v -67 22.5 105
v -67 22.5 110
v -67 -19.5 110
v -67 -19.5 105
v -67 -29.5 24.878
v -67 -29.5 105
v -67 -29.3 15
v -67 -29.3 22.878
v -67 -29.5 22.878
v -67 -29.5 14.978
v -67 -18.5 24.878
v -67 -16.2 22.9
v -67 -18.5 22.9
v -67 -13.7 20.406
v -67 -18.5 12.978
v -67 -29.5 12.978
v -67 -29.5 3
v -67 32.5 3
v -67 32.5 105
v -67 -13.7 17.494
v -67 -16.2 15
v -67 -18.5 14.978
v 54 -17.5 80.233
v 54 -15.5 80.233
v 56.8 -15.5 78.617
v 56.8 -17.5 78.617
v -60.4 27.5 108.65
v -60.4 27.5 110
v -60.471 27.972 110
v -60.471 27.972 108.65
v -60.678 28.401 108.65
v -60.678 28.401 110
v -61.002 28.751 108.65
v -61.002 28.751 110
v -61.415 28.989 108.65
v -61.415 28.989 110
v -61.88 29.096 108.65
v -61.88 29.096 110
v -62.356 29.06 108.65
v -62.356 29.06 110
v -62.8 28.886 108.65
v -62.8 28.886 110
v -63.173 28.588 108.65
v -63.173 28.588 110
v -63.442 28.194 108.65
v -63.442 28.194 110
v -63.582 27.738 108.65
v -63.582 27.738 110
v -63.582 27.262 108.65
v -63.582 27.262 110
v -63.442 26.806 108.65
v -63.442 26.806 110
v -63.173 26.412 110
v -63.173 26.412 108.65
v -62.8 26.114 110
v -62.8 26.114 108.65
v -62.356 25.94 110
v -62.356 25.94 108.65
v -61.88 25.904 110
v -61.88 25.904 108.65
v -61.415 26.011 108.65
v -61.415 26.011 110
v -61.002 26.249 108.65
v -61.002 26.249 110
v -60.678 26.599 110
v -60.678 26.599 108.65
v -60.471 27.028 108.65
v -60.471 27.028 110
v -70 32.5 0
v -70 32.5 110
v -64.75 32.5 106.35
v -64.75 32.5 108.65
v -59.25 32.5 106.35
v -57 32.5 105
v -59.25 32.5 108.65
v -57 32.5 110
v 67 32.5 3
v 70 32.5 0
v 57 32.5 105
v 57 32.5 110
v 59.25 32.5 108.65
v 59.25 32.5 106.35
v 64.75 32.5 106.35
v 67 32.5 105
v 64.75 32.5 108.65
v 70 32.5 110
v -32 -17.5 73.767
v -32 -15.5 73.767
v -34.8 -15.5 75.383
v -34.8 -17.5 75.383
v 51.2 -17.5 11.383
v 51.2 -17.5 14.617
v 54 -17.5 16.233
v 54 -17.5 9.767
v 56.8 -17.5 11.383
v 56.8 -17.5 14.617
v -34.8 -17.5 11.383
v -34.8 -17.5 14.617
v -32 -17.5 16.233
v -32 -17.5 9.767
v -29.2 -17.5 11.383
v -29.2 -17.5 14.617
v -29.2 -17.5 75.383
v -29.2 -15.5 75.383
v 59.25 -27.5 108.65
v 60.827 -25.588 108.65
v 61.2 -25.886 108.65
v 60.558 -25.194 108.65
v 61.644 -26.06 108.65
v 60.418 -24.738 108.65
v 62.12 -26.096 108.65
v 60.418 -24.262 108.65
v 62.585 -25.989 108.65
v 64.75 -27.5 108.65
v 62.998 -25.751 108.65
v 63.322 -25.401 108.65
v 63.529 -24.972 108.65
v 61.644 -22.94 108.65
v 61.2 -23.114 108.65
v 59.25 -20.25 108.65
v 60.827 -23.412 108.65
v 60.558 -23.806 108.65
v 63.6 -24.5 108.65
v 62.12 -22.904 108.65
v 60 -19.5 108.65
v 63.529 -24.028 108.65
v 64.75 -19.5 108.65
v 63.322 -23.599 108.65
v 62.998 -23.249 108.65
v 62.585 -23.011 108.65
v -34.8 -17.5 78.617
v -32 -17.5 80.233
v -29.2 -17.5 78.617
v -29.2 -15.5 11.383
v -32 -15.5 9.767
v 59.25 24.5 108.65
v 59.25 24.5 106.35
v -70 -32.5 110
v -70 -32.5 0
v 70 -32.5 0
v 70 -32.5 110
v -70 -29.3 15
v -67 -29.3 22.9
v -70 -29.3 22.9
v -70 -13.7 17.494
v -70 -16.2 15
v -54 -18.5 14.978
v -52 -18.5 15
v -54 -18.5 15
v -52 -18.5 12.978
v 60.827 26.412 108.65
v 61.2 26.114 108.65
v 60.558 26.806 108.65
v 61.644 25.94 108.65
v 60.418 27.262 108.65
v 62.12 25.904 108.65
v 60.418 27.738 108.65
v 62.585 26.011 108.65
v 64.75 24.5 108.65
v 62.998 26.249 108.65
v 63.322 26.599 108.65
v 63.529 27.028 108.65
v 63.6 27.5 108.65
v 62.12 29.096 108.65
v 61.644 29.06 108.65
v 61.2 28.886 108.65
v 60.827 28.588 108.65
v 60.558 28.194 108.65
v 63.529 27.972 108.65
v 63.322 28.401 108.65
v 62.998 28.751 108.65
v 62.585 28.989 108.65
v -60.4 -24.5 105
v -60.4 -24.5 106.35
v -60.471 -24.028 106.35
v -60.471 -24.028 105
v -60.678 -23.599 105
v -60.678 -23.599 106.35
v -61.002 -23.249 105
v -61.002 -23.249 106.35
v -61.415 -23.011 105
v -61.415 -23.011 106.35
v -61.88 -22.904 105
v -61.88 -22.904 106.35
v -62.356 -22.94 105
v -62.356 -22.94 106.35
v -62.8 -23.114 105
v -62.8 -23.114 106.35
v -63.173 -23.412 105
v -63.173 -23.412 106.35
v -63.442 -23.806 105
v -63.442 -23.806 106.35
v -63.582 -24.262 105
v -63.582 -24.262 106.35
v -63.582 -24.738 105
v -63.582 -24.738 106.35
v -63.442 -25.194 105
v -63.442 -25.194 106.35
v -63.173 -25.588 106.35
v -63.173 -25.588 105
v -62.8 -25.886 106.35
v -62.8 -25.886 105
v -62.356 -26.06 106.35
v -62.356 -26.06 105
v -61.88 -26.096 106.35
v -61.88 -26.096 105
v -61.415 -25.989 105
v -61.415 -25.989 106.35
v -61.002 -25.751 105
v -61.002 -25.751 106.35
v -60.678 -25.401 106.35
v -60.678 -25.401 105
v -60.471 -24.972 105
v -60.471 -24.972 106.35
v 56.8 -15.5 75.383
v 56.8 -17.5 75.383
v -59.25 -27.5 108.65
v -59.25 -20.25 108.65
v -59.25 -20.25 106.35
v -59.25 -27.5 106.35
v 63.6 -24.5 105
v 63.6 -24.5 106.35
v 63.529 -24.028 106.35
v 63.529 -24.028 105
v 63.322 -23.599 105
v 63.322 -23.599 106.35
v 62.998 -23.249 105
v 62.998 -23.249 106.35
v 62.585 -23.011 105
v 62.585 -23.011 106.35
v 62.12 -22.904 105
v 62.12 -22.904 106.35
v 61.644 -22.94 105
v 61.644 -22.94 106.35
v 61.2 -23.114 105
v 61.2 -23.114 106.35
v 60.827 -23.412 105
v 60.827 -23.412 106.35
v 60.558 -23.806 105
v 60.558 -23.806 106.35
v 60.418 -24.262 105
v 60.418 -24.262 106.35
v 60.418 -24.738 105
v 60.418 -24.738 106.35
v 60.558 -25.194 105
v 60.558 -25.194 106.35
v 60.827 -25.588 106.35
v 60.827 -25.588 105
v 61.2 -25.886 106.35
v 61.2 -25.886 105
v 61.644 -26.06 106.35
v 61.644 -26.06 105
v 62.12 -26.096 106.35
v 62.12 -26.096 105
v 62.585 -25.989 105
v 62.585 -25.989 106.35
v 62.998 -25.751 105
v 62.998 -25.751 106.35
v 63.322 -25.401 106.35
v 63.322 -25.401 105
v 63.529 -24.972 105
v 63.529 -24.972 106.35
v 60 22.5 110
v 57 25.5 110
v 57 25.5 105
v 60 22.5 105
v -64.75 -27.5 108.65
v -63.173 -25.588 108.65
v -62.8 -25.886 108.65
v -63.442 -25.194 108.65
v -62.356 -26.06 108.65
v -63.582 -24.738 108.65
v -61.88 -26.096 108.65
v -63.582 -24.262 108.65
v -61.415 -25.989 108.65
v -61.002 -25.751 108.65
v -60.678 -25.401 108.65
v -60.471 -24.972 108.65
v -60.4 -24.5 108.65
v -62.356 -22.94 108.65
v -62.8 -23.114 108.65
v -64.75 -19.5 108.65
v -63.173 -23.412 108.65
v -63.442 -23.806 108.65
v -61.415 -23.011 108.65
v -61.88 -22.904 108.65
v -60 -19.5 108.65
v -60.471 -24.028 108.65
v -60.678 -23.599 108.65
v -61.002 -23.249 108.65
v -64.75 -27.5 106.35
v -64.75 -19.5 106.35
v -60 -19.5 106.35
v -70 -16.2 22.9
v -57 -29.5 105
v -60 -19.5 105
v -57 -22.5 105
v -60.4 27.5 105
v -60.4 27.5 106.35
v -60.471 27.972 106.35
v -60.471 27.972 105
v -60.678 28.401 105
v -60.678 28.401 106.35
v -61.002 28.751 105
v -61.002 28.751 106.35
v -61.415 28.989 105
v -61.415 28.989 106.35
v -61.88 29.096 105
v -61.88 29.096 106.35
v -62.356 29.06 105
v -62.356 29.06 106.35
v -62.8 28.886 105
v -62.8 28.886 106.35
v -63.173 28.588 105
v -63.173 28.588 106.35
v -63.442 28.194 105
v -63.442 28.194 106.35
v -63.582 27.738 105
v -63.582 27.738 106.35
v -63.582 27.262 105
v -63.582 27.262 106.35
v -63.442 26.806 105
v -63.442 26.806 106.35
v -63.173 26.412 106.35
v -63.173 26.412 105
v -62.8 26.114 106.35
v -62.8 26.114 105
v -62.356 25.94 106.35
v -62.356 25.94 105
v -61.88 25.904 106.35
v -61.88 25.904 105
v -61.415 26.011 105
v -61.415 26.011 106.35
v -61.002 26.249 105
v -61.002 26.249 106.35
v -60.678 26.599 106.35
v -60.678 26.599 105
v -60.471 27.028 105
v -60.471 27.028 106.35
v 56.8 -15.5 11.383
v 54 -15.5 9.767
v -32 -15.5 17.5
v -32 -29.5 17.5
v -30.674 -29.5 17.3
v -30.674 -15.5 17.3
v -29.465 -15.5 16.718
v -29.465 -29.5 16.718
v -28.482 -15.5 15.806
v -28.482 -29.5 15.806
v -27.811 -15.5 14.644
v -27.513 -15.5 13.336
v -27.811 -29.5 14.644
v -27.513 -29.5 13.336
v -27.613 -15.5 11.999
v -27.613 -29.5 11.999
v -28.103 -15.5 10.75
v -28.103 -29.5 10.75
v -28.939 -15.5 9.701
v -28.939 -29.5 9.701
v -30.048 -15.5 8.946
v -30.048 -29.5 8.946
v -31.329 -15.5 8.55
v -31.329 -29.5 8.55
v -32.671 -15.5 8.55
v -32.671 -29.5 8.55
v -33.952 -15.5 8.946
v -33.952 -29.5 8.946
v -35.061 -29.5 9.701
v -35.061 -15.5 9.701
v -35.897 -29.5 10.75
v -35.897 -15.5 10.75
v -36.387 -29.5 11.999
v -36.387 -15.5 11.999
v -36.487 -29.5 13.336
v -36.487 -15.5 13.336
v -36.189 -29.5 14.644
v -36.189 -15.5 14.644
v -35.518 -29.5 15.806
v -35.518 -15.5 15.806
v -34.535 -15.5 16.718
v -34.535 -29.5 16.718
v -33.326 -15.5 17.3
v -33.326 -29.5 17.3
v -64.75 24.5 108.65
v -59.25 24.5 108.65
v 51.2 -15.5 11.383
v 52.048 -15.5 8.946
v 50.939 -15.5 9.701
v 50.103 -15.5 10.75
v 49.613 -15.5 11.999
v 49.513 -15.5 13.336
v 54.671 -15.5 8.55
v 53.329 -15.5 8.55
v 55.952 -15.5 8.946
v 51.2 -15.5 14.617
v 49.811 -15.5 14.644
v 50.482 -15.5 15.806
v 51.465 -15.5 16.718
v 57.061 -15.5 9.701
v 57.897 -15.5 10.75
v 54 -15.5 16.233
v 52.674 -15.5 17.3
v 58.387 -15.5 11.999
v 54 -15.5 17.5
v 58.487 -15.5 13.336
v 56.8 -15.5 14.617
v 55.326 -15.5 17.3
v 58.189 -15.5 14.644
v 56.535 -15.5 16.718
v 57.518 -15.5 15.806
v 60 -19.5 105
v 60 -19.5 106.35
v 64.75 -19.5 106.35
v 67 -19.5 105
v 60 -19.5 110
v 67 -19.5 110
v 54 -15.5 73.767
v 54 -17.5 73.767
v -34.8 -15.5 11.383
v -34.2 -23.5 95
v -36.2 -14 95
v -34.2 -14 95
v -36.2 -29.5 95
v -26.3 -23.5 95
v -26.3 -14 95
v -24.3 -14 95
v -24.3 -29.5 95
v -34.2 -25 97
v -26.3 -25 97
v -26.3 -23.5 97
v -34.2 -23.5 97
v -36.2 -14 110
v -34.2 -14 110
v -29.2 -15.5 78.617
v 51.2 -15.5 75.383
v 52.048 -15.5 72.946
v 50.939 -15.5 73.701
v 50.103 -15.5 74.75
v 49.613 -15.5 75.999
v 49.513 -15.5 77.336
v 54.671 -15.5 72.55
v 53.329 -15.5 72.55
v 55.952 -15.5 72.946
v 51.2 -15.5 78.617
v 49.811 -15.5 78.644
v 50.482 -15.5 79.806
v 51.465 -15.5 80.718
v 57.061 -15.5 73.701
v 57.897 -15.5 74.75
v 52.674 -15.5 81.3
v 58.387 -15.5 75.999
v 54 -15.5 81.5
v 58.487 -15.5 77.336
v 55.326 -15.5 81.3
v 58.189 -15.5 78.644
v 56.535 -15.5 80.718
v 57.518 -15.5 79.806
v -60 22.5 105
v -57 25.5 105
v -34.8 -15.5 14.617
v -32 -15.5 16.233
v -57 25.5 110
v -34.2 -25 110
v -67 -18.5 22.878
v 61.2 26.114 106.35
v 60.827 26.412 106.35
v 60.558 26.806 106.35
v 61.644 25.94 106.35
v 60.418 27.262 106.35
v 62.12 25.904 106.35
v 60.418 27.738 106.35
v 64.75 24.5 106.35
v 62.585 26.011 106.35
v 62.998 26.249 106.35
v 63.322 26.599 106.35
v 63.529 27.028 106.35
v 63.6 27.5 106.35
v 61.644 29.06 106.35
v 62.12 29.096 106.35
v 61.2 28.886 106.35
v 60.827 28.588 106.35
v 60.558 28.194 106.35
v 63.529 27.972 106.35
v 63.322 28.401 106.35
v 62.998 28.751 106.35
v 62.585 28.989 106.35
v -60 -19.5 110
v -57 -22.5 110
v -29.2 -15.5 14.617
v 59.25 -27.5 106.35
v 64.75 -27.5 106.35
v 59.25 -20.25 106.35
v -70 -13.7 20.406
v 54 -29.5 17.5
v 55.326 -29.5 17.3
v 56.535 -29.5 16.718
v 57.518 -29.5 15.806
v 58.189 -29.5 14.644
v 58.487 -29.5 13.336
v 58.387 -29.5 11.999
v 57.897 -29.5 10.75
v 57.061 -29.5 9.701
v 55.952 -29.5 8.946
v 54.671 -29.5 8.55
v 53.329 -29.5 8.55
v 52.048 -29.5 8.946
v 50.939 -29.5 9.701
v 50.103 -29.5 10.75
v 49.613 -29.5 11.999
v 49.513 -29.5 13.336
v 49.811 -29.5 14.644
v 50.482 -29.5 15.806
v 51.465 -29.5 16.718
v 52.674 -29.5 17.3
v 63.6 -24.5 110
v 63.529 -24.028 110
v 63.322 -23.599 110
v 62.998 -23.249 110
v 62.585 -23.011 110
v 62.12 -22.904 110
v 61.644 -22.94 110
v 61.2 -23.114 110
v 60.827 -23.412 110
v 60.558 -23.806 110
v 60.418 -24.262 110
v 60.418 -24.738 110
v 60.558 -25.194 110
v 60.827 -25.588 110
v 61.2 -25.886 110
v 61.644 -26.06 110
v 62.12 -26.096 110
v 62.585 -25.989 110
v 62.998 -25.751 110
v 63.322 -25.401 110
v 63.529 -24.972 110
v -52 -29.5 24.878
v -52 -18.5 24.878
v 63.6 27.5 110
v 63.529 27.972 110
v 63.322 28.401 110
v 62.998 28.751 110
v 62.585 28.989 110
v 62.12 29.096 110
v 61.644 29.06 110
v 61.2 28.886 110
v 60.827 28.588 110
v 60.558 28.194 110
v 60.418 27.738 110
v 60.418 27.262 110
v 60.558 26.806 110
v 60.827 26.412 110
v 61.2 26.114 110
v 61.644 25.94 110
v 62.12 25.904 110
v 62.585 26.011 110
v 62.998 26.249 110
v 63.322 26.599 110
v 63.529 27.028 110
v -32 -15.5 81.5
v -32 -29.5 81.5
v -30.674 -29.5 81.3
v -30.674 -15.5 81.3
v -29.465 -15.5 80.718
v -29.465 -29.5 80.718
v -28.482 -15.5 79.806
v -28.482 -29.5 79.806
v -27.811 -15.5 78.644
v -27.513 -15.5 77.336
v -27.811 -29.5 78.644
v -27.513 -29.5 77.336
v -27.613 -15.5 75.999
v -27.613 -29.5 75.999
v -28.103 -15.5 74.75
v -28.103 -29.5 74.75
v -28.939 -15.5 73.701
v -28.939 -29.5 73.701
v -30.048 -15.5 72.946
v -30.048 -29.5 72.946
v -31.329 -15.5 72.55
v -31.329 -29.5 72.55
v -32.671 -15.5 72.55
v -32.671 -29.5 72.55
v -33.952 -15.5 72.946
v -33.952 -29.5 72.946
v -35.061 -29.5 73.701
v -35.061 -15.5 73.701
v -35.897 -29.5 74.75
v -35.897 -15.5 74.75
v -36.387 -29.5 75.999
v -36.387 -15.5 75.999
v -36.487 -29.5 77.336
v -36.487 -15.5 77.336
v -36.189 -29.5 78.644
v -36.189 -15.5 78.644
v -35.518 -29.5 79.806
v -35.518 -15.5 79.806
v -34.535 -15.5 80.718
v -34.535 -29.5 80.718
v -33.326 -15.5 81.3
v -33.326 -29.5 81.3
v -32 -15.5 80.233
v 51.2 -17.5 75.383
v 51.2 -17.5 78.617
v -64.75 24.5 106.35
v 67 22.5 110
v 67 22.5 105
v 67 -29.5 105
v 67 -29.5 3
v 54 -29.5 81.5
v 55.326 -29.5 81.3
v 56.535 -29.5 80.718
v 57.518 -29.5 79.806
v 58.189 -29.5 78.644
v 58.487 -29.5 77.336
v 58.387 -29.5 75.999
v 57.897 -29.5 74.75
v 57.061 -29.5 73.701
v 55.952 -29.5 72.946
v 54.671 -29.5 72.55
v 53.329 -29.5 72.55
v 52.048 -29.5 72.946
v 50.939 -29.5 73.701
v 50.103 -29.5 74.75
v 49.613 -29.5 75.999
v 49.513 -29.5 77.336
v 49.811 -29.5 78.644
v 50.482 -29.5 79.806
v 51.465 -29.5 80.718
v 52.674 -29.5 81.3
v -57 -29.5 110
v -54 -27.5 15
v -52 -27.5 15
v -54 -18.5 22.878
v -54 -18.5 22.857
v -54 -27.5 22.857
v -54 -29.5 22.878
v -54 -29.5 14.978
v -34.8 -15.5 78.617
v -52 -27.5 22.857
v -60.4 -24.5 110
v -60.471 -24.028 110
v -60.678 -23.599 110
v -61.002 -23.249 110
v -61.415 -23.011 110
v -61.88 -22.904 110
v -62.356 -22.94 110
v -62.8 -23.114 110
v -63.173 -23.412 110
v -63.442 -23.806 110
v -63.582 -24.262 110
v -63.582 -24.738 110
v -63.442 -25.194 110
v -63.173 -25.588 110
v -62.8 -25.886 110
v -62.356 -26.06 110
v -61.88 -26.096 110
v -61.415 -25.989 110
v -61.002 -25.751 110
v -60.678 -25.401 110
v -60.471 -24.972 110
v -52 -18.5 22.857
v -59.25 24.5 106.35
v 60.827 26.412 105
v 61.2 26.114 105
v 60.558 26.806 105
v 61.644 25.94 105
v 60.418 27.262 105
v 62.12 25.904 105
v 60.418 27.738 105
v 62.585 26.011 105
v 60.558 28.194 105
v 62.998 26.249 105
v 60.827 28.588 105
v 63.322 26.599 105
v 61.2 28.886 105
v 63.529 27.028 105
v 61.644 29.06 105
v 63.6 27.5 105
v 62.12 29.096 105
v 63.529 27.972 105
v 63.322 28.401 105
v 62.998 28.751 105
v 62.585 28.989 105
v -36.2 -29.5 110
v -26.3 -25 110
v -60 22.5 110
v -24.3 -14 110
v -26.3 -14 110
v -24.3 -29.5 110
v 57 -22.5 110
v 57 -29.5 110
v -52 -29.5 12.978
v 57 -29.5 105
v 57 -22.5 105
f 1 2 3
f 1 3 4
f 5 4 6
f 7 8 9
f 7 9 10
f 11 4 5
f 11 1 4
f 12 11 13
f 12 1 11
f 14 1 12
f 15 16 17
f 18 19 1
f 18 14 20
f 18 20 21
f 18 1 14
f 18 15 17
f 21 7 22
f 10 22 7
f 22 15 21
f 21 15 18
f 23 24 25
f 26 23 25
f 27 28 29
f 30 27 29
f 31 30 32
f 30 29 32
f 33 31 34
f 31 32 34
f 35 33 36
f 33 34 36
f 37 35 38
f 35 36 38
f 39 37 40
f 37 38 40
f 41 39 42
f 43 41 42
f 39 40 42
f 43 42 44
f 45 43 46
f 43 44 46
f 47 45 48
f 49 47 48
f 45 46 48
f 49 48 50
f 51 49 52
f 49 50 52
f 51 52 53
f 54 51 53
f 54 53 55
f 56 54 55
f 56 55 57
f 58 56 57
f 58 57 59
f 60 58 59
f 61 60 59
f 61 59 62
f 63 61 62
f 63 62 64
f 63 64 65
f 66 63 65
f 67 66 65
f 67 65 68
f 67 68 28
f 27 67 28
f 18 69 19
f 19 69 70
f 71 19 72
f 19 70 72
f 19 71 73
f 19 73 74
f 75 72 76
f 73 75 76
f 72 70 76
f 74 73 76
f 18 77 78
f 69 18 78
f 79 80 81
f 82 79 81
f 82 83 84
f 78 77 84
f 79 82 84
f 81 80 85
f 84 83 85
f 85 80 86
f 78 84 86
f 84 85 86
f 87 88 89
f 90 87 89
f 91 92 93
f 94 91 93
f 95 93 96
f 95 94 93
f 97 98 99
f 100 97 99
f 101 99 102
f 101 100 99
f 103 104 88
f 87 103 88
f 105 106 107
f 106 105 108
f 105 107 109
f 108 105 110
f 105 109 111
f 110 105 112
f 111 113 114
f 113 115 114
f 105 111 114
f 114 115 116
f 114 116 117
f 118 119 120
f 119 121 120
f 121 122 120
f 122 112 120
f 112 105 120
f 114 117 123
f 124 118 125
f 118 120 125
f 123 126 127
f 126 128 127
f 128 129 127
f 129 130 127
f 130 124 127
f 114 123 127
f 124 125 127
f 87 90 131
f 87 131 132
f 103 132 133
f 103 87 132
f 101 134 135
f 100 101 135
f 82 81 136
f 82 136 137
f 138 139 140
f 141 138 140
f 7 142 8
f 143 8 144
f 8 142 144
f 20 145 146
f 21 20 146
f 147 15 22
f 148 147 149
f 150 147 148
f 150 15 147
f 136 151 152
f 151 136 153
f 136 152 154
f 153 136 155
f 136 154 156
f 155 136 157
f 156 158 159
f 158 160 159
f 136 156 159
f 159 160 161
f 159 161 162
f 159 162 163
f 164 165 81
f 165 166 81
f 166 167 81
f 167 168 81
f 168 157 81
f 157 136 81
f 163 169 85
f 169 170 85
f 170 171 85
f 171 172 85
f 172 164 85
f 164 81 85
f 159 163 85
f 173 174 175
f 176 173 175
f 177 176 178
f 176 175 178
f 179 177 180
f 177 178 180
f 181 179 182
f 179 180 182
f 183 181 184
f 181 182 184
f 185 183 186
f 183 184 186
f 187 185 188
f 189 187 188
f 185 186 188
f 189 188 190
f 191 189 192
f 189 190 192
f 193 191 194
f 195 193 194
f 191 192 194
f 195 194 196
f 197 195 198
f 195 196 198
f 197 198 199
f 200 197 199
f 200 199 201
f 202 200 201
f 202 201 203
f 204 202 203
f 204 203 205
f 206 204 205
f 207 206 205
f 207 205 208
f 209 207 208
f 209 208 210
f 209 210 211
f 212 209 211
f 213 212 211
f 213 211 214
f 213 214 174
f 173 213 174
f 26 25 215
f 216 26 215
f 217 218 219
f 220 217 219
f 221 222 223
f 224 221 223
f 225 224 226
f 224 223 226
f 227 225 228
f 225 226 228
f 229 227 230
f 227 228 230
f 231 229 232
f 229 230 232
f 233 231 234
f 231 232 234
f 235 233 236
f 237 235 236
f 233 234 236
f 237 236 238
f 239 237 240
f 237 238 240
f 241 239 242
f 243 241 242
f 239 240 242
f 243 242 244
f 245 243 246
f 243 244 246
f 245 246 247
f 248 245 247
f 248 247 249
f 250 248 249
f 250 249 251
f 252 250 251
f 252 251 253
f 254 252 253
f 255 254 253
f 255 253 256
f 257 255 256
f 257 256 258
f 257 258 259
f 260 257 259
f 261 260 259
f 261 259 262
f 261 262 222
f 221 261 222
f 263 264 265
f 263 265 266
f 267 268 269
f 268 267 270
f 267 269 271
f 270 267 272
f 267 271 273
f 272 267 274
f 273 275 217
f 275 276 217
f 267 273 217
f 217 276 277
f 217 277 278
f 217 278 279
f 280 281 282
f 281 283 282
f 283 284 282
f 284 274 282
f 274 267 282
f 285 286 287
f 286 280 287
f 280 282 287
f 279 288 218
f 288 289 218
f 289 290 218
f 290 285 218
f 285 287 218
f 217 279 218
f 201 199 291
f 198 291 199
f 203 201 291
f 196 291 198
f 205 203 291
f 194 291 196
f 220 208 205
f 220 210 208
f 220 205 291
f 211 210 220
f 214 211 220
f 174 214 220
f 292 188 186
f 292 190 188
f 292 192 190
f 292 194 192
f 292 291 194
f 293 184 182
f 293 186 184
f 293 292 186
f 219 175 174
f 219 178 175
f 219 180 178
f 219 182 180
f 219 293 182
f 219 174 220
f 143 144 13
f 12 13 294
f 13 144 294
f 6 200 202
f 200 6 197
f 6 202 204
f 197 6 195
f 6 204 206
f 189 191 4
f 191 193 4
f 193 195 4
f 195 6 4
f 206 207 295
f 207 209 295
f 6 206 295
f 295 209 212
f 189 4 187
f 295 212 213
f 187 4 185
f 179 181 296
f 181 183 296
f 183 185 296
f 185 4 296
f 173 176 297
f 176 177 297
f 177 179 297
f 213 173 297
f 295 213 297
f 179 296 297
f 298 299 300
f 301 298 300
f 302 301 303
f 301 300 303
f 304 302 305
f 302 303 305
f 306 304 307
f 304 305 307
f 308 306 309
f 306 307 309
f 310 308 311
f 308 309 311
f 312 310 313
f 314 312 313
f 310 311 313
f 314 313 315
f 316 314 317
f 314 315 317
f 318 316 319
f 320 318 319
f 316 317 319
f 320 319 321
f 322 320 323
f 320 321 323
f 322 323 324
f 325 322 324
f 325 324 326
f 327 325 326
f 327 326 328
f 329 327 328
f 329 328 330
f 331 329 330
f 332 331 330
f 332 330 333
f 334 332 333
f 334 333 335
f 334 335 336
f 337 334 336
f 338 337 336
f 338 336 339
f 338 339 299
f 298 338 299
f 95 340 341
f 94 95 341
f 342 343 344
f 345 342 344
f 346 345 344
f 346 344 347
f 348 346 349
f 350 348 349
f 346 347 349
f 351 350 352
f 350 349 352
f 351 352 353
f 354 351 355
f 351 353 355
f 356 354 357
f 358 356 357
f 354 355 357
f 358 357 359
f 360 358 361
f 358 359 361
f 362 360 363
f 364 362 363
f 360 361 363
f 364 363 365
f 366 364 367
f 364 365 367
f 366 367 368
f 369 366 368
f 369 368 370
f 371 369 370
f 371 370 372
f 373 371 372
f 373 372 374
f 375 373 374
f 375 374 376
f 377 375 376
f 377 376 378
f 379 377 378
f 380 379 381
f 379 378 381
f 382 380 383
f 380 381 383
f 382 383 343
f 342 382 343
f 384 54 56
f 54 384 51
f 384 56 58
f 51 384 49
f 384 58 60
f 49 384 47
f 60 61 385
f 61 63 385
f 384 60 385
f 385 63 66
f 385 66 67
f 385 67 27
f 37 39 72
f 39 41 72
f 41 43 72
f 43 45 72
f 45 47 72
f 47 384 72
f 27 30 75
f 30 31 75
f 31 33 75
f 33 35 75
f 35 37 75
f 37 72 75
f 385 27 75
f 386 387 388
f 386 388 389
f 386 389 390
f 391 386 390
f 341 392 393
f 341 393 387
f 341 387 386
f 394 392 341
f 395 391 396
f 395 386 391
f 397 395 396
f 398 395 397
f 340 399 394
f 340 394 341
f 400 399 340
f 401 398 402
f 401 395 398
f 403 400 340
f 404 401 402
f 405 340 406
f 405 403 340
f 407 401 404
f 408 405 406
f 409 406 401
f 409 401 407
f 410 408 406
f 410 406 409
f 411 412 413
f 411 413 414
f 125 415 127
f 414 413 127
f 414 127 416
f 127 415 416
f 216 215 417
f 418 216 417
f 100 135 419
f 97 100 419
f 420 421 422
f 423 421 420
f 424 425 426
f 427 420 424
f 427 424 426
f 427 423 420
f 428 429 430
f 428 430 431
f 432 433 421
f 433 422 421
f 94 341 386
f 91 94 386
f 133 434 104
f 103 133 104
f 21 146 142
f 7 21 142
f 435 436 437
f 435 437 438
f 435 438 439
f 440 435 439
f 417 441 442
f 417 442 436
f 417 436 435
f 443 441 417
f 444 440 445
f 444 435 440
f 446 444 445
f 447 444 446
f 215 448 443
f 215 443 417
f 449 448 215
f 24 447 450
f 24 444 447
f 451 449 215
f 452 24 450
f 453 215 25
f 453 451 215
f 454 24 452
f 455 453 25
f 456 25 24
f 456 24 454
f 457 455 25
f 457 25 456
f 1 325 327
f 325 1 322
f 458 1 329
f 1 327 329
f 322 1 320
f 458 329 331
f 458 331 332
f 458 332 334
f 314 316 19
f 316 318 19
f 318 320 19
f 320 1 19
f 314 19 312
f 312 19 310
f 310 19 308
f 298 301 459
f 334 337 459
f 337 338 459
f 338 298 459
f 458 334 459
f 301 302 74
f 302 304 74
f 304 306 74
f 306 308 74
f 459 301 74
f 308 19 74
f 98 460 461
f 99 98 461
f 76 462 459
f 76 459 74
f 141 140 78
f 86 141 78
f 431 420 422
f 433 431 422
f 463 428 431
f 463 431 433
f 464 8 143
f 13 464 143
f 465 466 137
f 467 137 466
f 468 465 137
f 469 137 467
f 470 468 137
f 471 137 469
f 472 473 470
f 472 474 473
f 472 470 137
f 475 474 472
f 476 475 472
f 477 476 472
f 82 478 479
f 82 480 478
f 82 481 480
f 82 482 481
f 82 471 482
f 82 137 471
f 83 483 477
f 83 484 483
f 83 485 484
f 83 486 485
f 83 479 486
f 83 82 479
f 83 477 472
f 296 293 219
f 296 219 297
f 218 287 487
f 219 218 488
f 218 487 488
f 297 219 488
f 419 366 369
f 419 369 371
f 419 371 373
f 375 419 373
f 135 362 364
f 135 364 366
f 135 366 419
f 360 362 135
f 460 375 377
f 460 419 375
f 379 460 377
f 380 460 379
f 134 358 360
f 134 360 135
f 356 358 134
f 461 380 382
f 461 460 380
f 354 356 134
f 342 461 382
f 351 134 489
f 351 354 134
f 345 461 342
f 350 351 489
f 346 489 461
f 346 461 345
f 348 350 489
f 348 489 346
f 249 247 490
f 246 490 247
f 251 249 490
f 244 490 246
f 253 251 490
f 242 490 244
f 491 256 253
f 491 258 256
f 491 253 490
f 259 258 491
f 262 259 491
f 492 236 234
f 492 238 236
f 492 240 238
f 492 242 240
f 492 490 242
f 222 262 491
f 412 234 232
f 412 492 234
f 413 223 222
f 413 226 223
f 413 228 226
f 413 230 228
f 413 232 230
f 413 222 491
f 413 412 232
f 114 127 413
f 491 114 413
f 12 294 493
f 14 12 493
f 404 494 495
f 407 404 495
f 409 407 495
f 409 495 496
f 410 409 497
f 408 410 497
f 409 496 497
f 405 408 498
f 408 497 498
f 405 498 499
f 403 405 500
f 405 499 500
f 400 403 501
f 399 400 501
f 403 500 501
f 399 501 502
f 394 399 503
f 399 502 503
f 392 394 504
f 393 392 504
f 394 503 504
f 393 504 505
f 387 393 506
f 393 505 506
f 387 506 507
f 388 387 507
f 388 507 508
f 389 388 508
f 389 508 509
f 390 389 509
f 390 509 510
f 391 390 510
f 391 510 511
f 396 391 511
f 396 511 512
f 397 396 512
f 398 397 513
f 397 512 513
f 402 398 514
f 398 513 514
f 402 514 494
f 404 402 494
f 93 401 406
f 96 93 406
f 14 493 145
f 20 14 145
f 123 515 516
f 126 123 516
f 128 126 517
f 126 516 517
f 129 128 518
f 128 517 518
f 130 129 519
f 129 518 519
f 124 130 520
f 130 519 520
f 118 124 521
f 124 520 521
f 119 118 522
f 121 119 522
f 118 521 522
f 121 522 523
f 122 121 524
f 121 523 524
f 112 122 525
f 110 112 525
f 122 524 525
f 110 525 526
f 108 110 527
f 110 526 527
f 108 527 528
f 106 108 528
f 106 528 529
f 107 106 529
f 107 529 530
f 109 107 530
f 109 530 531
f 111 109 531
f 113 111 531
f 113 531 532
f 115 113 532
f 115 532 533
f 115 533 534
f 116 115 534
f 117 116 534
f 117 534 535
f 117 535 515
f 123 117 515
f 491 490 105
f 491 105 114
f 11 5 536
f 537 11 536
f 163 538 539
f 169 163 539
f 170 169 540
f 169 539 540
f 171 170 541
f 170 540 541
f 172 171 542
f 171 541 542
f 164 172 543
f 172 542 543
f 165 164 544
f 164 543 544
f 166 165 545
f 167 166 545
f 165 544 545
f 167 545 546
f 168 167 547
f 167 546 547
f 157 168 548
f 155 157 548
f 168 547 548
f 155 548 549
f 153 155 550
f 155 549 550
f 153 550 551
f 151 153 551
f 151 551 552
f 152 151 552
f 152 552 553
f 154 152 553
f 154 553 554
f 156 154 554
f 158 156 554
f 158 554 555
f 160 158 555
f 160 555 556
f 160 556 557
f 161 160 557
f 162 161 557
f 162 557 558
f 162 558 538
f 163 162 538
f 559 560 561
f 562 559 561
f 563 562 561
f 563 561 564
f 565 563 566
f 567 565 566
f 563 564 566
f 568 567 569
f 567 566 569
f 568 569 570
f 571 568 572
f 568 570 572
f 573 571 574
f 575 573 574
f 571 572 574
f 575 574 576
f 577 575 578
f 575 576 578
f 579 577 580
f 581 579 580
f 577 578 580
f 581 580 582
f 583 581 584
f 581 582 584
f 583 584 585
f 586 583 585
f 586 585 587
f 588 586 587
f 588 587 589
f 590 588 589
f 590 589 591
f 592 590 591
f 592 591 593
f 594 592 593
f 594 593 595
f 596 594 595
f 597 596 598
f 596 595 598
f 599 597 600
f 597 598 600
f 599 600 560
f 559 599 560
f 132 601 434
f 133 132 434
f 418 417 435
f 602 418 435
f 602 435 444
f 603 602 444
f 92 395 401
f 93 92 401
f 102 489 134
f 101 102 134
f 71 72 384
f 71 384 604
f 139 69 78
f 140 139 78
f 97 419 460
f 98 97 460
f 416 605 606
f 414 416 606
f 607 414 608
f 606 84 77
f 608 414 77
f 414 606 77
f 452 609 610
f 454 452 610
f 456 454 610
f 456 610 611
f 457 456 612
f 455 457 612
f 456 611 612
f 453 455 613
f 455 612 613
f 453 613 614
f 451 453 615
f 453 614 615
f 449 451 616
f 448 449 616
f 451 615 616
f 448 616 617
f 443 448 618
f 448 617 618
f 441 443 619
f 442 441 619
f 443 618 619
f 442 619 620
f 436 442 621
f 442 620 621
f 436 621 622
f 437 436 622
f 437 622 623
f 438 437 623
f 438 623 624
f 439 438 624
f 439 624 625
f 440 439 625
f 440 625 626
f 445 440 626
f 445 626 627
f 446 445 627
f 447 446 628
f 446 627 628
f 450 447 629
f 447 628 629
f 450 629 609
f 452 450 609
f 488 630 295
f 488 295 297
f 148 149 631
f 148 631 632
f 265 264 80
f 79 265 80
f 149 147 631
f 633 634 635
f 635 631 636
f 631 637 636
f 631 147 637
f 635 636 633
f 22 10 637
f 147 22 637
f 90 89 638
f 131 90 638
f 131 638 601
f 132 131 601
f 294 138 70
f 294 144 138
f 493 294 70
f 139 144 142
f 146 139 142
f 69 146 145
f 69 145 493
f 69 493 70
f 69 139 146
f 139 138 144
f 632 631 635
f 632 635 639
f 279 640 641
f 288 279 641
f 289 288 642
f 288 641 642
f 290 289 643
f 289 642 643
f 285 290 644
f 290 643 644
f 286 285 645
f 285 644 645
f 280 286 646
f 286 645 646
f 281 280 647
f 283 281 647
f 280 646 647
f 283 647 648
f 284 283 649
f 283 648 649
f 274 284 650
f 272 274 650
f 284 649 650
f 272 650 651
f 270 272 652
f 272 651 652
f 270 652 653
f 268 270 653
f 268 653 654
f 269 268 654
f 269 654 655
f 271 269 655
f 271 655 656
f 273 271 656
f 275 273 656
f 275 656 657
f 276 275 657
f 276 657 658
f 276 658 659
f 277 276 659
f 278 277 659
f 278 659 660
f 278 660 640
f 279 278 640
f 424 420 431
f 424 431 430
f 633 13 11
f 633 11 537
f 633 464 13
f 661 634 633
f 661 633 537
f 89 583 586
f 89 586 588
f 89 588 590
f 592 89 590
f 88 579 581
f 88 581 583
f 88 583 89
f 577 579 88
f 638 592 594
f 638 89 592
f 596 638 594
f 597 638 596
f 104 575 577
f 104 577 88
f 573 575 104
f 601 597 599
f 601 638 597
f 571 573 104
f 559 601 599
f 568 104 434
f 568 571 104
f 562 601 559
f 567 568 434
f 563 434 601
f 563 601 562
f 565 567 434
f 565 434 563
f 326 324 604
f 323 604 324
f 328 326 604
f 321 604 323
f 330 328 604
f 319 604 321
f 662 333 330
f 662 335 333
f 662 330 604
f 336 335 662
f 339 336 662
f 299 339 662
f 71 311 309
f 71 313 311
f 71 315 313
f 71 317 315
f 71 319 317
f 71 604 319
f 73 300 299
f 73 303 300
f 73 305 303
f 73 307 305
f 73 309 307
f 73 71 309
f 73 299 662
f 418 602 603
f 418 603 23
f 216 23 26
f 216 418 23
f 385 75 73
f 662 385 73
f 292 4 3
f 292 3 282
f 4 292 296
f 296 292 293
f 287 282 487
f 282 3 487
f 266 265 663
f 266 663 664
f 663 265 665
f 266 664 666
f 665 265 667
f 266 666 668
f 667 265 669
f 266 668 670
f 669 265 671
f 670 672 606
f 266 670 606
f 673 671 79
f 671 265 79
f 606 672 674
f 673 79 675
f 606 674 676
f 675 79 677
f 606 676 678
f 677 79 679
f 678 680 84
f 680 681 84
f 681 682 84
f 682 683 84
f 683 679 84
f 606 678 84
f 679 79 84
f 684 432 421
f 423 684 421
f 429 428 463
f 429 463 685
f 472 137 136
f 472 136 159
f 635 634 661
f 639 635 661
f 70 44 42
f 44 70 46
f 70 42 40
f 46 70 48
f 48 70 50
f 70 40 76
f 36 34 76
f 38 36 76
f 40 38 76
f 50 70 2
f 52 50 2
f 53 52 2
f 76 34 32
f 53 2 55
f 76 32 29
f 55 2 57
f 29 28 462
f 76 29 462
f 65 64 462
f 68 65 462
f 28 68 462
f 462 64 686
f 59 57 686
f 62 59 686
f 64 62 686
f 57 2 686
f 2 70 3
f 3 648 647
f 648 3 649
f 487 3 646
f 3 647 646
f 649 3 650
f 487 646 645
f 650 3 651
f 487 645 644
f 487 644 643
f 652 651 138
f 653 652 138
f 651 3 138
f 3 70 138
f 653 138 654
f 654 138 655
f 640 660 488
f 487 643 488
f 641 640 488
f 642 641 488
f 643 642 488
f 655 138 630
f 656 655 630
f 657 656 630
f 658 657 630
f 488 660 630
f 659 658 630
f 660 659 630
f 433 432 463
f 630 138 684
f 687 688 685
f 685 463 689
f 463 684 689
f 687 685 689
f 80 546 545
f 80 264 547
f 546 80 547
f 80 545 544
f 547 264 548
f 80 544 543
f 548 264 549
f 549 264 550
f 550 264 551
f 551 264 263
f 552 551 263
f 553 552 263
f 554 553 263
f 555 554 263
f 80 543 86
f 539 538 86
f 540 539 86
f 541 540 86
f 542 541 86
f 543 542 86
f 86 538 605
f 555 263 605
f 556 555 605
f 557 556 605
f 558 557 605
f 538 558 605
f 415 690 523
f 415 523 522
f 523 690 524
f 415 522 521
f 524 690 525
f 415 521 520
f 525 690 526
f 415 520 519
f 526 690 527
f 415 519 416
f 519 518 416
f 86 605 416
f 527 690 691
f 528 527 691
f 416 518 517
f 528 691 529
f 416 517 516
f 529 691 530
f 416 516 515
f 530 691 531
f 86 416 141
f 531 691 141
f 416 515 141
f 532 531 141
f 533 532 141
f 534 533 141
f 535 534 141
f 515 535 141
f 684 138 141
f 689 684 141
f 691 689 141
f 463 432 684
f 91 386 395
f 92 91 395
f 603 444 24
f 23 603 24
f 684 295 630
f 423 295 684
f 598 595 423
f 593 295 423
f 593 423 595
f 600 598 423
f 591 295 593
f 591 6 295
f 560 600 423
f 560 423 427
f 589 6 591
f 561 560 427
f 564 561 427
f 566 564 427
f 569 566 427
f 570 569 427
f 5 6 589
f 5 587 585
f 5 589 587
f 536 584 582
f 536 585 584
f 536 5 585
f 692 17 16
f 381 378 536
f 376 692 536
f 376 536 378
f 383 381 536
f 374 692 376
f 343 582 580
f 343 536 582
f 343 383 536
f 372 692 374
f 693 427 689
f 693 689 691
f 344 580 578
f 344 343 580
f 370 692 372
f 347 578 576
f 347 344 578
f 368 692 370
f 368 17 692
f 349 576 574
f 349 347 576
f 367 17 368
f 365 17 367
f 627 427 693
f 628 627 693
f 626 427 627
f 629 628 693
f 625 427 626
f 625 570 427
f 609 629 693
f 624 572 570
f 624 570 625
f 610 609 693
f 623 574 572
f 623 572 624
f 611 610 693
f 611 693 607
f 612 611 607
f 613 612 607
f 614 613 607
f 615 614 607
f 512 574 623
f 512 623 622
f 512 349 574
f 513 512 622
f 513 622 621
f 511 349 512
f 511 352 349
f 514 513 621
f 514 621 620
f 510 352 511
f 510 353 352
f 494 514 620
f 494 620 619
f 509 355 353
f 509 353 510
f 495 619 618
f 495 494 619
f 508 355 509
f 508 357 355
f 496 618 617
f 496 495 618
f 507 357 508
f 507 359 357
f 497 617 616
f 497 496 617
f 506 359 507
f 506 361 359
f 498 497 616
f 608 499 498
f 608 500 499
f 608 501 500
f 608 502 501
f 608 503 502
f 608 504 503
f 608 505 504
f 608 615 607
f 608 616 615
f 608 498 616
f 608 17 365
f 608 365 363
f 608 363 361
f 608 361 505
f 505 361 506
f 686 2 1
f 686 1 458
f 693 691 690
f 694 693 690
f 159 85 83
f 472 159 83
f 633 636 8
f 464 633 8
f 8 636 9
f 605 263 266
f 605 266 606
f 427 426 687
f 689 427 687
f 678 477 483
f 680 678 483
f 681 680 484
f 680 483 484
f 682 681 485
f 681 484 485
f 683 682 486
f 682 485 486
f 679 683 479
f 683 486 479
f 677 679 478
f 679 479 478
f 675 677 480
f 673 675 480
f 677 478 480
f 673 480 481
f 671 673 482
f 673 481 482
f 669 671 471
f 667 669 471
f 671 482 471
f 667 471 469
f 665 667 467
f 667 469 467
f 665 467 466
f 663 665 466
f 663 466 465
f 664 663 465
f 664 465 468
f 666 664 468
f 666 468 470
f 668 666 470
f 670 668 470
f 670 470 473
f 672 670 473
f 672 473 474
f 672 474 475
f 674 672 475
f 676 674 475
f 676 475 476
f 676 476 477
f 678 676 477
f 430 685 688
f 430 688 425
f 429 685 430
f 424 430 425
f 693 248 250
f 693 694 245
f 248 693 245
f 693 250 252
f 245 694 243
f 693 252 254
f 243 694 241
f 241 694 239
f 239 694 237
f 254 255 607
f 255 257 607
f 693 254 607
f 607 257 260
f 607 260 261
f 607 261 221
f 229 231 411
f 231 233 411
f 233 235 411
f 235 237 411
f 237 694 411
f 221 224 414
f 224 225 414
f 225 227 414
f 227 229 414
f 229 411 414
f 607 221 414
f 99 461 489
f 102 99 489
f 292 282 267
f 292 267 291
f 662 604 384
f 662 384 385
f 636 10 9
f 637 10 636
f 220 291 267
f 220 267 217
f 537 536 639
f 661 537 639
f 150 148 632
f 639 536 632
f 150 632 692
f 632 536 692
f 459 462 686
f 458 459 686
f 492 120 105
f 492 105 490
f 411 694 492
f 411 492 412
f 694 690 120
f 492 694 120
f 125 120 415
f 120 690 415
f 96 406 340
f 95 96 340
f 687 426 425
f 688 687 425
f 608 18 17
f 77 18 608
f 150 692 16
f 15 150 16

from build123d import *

# Parameters (mm, degrees)
SKETCH_2_W          = 140
SKETCH_2_H          = 65
EXTRUDE_1_DEPTH     = 110
SKETCH_3_W          = 134
SKETCH_3_H          = 107
CUT_EXTRUDE_1_DEPTH = 62
SKETCH_4_W          = 10
SKETCH_4_H          = 10
SKETCH_4_R          = 1.6
EXTRUDE_2_DEPTH     = 5
SKETCH_5_W          = 10
SKETCH_5_H          = 10
SKETCH_5_R          = 1.6
EXTRUDE_3_DEPTH     = 5
SKETCH_6_W          = 5.5
SKETCH_6_H          = 2.3
CUT_EXTRUDE_2_DEPTH = 8
SKETCH_8_W          = 5.5
SKETCH_8_H          = 2.3
CUT_EXTRUDE_3_DEPTH = 8
CHAMFER_1_SIZE      = 3
SKETCH_9_R          = 4.5
EXTRUDE_4_DEPTH     = 14
CUT_EXTRUDE_4_DEPTH = 2
CUT_EXTRUDE_5_REACH = 182.987
EXTRUDE_5_DEPTH     = 11
SKETCH_16_W         = 5.817441426
SKETCH_16_H         = 7.857396667
CUT_EXTRUDE_6_DEPTH = 9
EXTRUDE_6_DEPTH     = 15.5
SKETCH_18_W         = 7.9
SKETCH_18_H         = 11.370001712
CUT_EXTRUDE_7_DEPTH = 9.5
SKETCH_19_W         = 7.9
SKETCH_19_H         = 13
EXTRUDE_7_DEPTH     = 4.5


with BuildPart() as part:
    # Эскиз2 → Бобышка-Вытянуть1 (new body)
    with BuildSketch(Plane.XY):
        Rectangle(SKETCH_2_W, SKETCH_2_H)
    extrude(amount=EXTRUDE_1_DEPTH)

    # Эскиз3 → Вырез-Вытянуть1 (cut)
    with BuildSketch(Plane(origin=(0, 32.5, 0), x_dir=(1, 0, 0), z_dir=(0, 1, 0))):
        with Locations((0, -56.5)):
            Rectangle(SKETCH_3_W, SKETCH_3_H)
    extrude(amount=-CUT_EXTRUDE_1_DEPTH, mode=Mode.SUBTRACT)

    # Эскиз4 → Бобышка-Вытянуть2 (add)
    # profile 1 of 2: a face of its own
    with BuildSketch(Plane.XY.offset(110)):
        with Locations((62, -24.5)):
            Rectangle(SKETCH_4_W, SKETCH_4_H)
        with Locations((62, -24.5)):
            Circle(SKETCH_4_R, mode=Mode.SUBTRACT)
    # profile 2 of 2: a face of its own
    with BuildSketch(Plane.XY.offset(110)):
        with Locations((-62, -24.5)):
            Rectangle(SKETCH_4_W, SKETCH_4_H)
        with Locations((-62, -24.5)):
            Circle(SKETCH_4_R, mode=Mode.SUBTRACT)
    extrude(amount=-EXTRUDE_2_DEPTH)

    # Эскиз5 → Бобышка-Вытянуть3 (add)
    # profile 1 of 2: a face of its own
    with BuildSketch(Plane.XY.offset(110)):
        with Locations((62, 27.5)):
            Rectangle(SKETCH_5_W, SKETCH_5_H)
        with Locations((62, 27.5)):
            Circle(SKETCH_5_R, mode=Mode.SUBTRACT)
    # profile 2 of 2: a face of its own
    with BuildSketch(Plane.XY.offset(110)):
        with Locations((-62, 27.5)):
            Rectangle(SKETCH_5_W, SKETCH_5_H)
        with Locations((-62, 27.5)):
            Circle(SKETCH_5_R, mode=Mode.SUBTRACT)
    extrude(amount=-EXTRUDE_3_DEPTH)

    # Эскиз6 → Вырез-Вытянуть2 (cut)
    with BuildSketch(Plane(origin=(0, 32.5, 0), x_dir=(1, 0, 0), z_dir=(0, 1, 0))):
        with Locations((-62, -107.5)):
            Rectangle(SKETCH_6_W, SKETCH_6_H)
        with Locations((62, -107.5)):
            Rectangle(SKETCH_6_W, SKETCH_6_H)
    extrude(amount=-CUT_EXTRUDE_2_DEPTH, mode=Mode.SUBTRACT)

    # Эскиз8 → Вырез-Вытянуть3 (cut)
    with BuildSketch(Plane(origin=(0, -19.5, 0), x_dir=(1, 0, 0), z_dir=(0, 1, 0))):
        with Locations((62, -107.5)):
            Rectangle(SKETCH_8_W, SKETCH_8_H)
        with Locations((-62, -107.5)):
            Rectangle(SKETCH_8_W, SKETCH_8_H)
    extrude(amount=-CUT_EXTRUDE_3_DEPTH, mode=Mode.SUBTRACT)

    # Фаска1
    # the kernel refuses this chamfer: 3 mm, written as the material it takes off along each edge
    with BuildSketch(Plane(origin=(57, 22.5, 117.715048964), x_dir=(-0.027495876610586768, 0.9996219169112968, 0), z_dir=(0, 0, -1))) as chamfer_1_piece_1:
        Polygon((CHAMFER_1_SIZE * 0.999621916911, CHAMFER_1_SIZE * 0.0274958766106), (-CHAMFER_1_SIZE * 0.0274958766106, CHAMFER_1_SIZE * 0.999621916911), (0, 0), align=None)
    extrude(amount=20.430097928, mode=Mode.SUBTRACT)
    with BuildSketch(Plane(origin=(57, -19.5, 117.715048964), x_dir=(-0.027495876610586768, -0.9996219169112968, 0), z_dir=(0, 0, -1)), Plane(origin=(-57, 22.5, 117.715048964), x_dir=(0.027495876610586733, 0.9996219169112968, 0), z_dir=(0, 0, -1)), Plane(origin=(-57, -19.5, 117.715048964), x_dir=(-0.9996219169112965, 0.02749587661058676, 0), z_dir=(0, 0, -1))) as chamfer_1_piece_2:
        Polygon((CHAMFER_1_SIZE * 0.999621916911, -CHAMFER_1_SIZE * 0.0274958766106), (-CHAMFER_1_SIZE * 0.0274958766106, -CHAMFER_1_SIZE * 0.999621916911), (0, 0), align=None)
    extrude(amount=20.430097928, mode=Mode.SUBTRACT)

    # Эскиз9 → Бобышка-Вытянуть4 (add)
    with BuildSketch(Plane(origin=(0, -29.5, 0), x_dir=(1, 0, 0), z_dir=(0, 1, 0))):
        with Locations(Location((54, -13, 0), (0, 0, 270))):
            Circle(SKETCH_9_R)
        with Locations(Location((-32, -13, 0), (0, 0, 270))):
            Circle(SKETCH_9_R)
        with Locations(Location((-32, -77, 0), (0, 0, 270))):
            Circle(SKETCH_9_R)
        with Locations(Location((54, -77, 0), (0, 0, 270))):
            Circle(SKETCH_9_R)
    extrude(amount=EXTRUDE_4_DEPTH)

    # Эскиз12 → Вырез-Вытянуть4 (cut)
    with BuildSketch(Plane(origin=(0, -15.5, 0), x_dir=(1, 0, 0), z_dir=(0, 1, 0))):
        Polygon((54, -9.766838493), (51.2, -11.383419246), (51.2, -14.616580754), (54, -16.233161507), (56.8, -14.616580754), (56.8, -11.383419246), align=None)
        Polygon((-32, -9.766838493), (-34.8, -11.383419246), (-34.8, -14.616580754), (-32, -16.233161507), (-29.2, -14.616580754), (-29.2, -11.383419246), align=None)
        Polygon((54, -73.766838493), (51.2, -75.383419246), (51.2, -78.616580754), (54, -80.233161507), (56.8, -78.616580754), (56.8, -75.383419246), align=None)
        Polygon((-32, -73.766838493), (-34.8, -75.383419246), (-34.8, -78.616580754), (-32, -80.233161507), (-29.2, -78.616580754), (-29.2, -75.383419246), align=None)
    extrude(amount=-CUT_EXTRUDE_4_DEPTH, mode=Mode.SUBTRACT)

    # Эскиз13 → Вырез-Вытянуть5 (cut, up to next)
    with BuildSketch(Plane.ZY.offset(70), mode=Mode.PRIVATE) as cut_extrude_5_sk1:
        Polygon((15, -29.3), (22.9, -29.3), (22.9, -16.2), (20.405788704, -13.7), (17.494211296, -13.7), (15, -16.2), align=None)
    cut_extrude_5_tool1 = extrude(cut_extrude_5_sk1.sketch, amount=-CUT_EXTRUDE_5_REACH, mode=Mode.PRIVATE) & part.part
    add(cut_extrude_5_tool1.solids().sort_by_distance((-70, -21.871275, 18.95))[0], mode=Mode.SUBTRACT)

    # Эскиз15 → Бобышка-Вытянуть5 (add)
    with BuildSketch(Plane(origin=(0, -29.5, 0), x_dir=(1, 0, 0), z_dir=(0, 1, 0))):
        Polygon((-67, -24.878202282), (-52, -24.878202282), (-52, -12.978202282), (-67, -12.978202282), (-67, -14.978202282), (-54, -14.978202282), (-54, -22.878202282), (-67, -22.878202282), align=None)
    extrude(amount=EXTRUDE_5_DEPTH)

    # Эскиз16 → Вырез-Вытянуть6 (cut)
    with BuildSketch(Plane(origin=(0, -18.5, 0), x_dir=(1, 0, 0), z_dir=(0, 1, 0))):
        with Locations((-52, -18.928202283)):
            Rectangle(SKETCH_16_W, SKETCH_16_H)
    extrude(amount=-CUT_EXTRUDE_6_DEPTH, mode=Mode.SUBTRACT)

    # Эскиз17 → Бобышка-Вытянуть6 (add)
    with BuildSketch(Plane(origin=(0, -29.5, 0), x_dir=(1, 0, 0), z_dir=(0, 1, 0))):
        Polygon((-36.2, -110), (-36.2, -95), (-24.3, -95), (-24.3, -110), (-26.3, -110), (-26.3, -97), (-34.2, -97), (-34.2, -110), align=None)
    extrude(amount=EXTRUDE_6_DEPTH)

    # Эскиз18 → Вырез-Вытянуть7 (cut)
    with BuildSketch(Plane(origin=(0, -14, 0), x_dir=(1, 0, 0), z_dir=(0, 1, 0))):
        with Locations((-30.25, -95)):
            Rectangle(SKETCH_18_W, SKETCH_18_H)
    extrude(amount=-CUT_EXTRUDE_7_DEPTH, mode=Mode.SUBTRACT)

    # Эскиз19 → Бобышка-Вытянуть7 (add)
    with BuildSketch(Plane(origin=(0, -29.5, 0), x_dir=(1, 0, 0), z_dir=(0, 1, 0))):
        with Locations((-30.25, -103.5)):
            Rectangle(SKETCH_19_W, SKETCH_19_H)
    extrude(amount=EXTRUDE_7_DEPTH)


solid = part.part
